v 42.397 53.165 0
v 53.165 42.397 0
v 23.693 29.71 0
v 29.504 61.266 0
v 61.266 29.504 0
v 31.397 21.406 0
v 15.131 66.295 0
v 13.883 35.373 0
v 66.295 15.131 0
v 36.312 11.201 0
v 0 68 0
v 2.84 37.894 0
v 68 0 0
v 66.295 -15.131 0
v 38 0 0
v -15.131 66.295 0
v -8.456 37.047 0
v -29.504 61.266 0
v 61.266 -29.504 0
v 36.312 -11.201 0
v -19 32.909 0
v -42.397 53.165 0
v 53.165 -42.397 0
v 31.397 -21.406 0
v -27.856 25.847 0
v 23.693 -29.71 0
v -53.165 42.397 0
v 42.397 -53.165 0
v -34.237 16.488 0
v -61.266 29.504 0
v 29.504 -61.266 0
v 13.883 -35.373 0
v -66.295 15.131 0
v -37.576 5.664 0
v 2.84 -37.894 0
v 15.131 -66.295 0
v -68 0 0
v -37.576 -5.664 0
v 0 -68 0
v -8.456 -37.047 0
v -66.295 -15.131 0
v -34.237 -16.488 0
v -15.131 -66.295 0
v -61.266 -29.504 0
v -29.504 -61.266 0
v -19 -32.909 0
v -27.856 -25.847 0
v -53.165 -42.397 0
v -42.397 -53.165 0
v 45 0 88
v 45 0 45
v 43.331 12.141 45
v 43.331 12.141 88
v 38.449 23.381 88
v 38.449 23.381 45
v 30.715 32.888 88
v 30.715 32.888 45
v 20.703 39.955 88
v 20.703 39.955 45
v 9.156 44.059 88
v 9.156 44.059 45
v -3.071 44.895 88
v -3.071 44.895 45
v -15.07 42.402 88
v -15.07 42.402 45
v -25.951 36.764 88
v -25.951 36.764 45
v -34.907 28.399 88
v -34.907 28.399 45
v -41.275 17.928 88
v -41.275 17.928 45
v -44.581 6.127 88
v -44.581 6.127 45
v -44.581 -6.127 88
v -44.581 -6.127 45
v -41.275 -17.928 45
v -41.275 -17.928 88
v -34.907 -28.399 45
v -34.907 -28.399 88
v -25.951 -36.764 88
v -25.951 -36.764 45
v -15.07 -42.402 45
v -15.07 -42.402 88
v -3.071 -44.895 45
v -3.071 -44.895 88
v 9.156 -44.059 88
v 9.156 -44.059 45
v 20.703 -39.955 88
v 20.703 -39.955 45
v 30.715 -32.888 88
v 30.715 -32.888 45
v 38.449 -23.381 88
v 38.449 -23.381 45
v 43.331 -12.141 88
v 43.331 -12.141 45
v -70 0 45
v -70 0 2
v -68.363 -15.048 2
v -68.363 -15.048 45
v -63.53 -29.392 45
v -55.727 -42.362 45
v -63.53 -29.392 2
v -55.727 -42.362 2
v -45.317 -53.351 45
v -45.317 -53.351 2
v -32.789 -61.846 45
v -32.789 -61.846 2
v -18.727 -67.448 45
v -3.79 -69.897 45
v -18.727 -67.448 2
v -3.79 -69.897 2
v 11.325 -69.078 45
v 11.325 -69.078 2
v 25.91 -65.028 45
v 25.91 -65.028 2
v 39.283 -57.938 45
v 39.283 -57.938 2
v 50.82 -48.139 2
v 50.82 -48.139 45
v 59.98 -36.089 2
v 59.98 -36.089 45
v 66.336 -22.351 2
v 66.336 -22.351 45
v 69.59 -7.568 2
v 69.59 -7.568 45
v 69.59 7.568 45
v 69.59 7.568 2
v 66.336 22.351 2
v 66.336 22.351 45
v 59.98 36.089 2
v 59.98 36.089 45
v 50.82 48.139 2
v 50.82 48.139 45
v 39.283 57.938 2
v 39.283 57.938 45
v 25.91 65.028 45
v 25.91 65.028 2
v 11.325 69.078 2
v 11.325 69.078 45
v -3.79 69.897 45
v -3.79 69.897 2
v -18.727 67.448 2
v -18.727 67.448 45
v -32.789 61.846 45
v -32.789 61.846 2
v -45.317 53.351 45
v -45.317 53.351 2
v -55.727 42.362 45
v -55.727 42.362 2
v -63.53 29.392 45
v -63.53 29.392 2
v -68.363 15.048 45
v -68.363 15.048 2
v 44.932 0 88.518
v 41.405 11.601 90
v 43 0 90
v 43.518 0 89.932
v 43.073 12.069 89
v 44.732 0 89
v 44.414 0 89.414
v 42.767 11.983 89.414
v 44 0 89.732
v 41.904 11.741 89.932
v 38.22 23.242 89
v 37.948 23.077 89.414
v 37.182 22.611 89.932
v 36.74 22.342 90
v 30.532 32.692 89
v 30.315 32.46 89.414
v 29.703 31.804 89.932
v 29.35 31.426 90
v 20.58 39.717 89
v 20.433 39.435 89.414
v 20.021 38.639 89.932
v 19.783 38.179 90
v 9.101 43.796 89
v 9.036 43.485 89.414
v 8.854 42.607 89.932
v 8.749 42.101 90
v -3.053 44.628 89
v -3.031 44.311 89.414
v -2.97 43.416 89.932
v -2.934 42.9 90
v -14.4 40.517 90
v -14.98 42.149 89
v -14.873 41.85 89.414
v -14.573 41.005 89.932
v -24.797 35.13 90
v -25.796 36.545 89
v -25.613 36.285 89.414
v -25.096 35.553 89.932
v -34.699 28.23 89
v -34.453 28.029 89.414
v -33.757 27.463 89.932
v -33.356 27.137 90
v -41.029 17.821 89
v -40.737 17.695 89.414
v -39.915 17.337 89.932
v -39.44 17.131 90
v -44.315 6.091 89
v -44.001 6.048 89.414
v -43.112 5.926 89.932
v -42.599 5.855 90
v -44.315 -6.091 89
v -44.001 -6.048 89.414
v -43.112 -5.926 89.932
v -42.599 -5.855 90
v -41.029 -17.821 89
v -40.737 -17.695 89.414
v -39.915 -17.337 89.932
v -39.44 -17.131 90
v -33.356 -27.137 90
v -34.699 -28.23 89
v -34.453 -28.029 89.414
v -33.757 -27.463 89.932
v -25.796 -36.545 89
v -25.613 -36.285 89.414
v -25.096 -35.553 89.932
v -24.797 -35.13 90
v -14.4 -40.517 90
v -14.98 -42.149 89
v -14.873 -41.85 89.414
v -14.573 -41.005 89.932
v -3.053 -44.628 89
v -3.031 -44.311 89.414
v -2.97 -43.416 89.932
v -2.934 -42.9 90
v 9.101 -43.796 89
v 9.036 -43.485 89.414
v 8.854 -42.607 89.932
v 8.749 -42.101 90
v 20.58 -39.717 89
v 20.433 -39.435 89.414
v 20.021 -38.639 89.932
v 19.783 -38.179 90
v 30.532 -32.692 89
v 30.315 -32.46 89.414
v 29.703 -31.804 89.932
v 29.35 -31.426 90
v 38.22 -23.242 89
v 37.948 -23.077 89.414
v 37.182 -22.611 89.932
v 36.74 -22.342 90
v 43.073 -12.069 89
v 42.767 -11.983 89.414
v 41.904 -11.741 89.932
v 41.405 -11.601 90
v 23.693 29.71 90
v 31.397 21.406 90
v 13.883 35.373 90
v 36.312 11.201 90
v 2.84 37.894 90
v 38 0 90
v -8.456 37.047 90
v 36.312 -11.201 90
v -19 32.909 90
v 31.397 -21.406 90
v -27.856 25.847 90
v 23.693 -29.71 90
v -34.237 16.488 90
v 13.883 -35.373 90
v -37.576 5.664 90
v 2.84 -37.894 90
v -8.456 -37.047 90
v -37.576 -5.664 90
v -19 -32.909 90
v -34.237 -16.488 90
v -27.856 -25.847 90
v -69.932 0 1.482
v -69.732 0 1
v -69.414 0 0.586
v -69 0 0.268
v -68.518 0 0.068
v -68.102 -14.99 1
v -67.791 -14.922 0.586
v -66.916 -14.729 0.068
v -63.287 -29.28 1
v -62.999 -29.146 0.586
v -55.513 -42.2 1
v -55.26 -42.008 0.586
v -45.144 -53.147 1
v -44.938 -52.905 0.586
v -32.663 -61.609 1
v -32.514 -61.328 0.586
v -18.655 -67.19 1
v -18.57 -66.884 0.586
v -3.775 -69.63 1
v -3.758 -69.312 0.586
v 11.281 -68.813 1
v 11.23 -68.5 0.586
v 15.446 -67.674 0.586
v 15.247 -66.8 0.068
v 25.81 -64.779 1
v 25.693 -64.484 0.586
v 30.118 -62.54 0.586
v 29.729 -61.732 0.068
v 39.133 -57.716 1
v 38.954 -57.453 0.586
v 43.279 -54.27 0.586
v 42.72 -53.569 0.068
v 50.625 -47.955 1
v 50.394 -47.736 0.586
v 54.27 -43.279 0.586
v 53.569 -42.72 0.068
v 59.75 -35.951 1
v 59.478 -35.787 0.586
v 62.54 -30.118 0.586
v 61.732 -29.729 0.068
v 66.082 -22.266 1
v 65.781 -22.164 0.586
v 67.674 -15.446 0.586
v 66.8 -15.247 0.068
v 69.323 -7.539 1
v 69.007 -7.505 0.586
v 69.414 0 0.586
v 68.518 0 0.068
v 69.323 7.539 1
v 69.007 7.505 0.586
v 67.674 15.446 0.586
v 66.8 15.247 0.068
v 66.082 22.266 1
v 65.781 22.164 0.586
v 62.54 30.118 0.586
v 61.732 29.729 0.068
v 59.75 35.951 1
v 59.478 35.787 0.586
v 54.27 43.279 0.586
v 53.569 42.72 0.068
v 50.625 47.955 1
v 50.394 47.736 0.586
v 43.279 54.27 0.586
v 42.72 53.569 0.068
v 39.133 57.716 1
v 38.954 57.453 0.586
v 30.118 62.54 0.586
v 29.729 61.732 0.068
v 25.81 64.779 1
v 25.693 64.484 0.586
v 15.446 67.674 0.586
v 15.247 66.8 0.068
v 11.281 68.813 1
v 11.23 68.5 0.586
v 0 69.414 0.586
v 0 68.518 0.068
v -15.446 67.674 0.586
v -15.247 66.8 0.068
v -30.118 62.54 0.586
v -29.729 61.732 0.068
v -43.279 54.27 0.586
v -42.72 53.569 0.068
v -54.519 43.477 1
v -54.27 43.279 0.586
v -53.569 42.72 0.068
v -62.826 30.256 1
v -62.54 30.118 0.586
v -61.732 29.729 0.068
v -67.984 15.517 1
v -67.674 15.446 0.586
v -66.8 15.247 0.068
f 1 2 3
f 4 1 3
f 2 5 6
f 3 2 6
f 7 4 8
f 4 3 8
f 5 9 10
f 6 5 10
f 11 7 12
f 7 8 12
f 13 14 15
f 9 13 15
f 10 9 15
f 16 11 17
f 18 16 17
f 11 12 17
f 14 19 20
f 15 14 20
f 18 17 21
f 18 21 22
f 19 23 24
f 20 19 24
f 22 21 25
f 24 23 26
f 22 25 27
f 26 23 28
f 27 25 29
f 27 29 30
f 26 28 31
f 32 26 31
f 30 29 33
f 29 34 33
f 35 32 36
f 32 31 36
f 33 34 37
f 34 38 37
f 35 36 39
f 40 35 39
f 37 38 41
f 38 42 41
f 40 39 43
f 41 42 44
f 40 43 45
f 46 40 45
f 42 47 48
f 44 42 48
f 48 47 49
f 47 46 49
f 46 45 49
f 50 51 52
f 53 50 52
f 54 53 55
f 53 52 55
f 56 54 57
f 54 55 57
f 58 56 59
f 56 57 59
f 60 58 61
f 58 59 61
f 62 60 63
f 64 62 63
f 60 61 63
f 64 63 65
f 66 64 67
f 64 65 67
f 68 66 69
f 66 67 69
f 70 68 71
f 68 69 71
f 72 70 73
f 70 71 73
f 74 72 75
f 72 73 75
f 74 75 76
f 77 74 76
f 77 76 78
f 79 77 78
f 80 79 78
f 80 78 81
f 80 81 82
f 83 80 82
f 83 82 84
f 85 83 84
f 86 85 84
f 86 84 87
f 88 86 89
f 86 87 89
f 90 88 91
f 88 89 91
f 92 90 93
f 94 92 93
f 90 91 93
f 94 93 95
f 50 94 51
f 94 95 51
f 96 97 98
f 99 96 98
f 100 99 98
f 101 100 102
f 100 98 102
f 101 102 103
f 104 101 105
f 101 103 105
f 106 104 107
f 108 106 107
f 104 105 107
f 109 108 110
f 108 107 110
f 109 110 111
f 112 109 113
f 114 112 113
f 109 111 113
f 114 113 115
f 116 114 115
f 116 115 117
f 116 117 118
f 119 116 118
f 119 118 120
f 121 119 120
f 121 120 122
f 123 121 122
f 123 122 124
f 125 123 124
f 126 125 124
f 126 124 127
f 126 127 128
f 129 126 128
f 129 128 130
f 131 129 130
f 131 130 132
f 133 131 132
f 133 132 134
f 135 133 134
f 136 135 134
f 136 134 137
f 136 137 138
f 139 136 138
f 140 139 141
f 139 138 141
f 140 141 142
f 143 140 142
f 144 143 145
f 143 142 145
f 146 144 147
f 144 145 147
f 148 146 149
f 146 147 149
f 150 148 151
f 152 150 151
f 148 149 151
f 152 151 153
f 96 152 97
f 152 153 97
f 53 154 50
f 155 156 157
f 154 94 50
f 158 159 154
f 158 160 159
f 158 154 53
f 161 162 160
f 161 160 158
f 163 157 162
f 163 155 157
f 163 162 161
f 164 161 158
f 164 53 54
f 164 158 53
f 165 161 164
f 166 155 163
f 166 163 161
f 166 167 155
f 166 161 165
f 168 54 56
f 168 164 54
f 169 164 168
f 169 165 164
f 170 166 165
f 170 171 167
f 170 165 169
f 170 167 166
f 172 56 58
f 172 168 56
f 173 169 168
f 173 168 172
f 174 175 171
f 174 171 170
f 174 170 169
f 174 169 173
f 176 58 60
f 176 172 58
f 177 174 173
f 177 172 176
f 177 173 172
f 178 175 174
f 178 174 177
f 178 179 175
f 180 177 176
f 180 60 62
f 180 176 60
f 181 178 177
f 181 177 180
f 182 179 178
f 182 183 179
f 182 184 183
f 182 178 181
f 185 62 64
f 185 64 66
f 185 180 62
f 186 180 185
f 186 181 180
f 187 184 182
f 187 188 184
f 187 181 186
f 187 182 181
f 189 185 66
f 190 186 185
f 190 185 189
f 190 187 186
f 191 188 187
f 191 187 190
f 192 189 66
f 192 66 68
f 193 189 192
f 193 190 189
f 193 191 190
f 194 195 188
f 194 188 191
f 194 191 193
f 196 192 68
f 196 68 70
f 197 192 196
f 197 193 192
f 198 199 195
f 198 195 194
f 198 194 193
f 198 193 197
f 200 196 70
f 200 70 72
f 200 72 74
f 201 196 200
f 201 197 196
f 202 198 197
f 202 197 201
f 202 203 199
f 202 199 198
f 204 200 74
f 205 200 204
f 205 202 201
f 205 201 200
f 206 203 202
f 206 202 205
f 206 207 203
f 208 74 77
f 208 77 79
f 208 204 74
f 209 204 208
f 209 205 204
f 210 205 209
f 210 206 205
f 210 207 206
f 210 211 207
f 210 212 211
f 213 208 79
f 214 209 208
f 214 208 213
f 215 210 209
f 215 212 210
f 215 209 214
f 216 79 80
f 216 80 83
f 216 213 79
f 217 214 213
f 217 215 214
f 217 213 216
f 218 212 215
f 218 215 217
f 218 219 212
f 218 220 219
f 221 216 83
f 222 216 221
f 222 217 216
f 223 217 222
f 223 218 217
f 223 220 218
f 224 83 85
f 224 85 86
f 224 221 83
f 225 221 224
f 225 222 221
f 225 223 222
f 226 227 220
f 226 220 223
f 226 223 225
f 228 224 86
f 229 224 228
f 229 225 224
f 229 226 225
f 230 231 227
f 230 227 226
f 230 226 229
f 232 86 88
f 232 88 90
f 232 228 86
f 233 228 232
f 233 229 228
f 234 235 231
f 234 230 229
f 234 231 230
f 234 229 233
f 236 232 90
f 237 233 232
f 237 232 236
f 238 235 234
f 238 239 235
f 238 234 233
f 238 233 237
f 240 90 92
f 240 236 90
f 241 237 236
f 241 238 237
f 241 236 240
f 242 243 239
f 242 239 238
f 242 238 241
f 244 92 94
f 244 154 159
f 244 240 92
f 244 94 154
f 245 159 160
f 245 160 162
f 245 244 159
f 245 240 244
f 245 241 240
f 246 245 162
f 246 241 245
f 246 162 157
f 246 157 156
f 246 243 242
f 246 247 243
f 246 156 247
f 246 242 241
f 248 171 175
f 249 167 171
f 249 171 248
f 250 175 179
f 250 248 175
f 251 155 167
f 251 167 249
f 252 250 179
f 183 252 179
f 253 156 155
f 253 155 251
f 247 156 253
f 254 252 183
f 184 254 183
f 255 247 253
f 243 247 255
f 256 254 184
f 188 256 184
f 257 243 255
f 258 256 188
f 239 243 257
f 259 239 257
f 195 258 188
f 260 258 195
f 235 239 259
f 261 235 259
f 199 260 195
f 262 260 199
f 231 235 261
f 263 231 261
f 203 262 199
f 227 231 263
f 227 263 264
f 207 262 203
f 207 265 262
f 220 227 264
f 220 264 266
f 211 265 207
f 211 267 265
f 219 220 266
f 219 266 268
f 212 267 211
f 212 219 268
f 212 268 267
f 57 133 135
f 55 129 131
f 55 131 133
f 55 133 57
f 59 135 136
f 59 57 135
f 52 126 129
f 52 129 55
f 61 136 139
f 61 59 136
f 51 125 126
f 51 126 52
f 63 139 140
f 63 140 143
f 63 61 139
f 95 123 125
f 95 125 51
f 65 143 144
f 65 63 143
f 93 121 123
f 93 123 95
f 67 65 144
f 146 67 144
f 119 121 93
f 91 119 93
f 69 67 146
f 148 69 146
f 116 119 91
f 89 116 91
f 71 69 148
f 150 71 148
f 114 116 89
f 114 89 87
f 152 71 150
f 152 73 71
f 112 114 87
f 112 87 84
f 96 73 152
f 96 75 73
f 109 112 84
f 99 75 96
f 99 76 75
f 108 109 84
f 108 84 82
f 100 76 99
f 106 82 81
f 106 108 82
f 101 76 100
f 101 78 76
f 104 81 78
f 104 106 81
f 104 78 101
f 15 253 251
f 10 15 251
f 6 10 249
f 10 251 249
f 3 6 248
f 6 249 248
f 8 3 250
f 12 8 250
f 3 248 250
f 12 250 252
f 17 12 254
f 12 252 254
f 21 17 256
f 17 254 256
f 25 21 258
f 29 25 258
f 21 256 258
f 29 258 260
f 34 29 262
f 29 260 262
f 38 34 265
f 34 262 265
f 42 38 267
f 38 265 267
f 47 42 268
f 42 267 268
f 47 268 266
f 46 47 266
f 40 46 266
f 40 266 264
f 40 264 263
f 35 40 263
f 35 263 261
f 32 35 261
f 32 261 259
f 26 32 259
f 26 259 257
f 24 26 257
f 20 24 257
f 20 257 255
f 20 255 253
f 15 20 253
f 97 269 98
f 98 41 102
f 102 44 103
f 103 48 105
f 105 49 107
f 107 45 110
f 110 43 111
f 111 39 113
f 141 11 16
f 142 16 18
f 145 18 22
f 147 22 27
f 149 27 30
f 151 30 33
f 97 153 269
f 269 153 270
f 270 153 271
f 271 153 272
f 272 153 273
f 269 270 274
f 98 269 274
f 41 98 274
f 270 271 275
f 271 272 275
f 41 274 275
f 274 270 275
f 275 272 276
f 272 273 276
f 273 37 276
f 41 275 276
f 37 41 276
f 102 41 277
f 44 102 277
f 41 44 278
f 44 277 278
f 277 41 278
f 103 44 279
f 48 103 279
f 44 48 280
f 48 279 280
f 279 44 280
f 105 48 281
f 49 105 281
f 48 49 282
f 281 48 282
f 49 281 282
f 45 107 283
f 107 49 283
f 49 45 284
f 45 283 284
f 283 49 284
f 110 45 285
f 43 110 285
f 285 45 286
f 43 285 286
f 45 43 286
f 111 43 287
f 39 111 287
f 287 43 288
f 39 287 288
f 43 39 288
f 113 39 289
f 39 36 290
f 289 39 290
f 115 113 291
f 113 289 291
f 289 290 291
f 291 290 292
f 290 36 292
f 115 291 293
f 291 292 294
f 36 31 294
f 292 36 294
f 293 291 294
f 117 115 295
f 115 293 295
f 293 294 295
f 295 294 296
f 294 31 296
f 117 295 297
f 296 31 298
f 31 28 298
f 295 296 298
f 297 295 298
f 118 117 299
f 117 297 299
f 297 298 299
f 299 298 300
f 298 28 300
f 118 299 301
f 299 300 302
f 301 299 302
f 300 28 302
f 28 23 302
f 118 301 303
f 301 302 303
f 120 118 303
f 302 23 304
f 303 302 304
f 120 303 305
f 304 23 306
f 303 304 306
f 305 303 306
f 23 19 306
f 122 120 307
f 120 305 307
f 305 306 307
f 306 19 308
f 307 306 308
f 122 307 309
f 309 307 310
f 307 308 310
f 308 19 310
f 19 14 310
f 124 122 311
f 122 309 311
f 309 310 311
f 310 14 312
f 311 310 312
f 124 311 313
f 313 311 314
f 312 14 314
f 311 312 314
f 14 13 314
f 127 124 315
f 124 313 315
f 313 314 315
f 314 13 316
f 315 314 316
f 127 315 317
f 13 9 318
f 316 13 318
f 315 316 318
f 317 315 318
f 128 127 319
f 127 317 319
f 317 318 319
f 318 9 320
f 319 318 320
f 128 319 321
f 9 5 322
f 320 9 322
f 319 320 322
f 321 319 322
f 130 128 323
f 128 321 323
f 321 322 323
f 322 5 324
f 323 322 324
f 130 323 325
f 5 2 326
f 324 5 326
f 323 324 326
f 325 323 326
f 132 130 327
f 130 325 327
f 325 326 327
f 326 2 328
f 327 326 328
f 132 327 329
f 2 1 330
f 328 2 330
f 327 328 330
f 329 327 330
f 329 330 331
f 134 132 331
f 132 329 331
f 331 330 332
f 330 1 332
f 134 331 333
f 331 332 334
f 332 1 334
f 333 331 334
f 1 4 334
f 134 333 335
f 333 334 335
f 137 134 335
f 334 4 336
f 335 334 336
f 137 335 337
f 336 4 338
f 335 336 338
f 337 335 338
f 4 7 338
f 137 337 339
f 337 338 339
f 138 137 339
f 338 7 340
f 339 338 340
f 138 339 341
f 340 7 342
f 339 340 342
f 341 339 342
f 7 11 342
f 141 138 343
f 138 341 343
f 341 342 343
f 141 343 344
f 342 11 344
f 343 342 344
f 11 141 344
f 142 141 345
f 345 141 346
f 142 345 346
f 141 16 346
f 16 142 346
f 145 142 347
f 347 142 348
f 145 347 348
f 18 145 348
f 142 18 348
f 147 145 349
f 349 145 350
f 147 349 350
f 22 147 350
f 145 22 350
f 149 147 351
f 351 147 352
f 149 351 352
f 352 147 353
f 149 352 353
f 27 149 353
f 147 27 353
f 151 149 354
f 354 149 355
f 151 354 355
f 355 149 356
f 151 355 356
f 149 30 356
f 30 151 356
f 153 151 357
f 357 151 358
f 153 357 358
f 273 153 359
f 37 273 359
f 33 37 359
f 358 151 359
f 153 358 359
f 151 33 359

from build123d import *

# Parameters (mm, degrees)
SKETCH_1_R          = 70
EXTRUDE_1_DEPTH     = 90
SKETCH_2_R          = 38
CUT_EXTRUDE_1_DEPTH = 134.790881603
CUT_EXTRUDE_START   = -45
SKETCH_3_R          = 70
SKETCH_3_R_2        = 45
CUT_EXTRUDE_2_DEPTH = 45
FILLET_1_R          = 2


with BuildPart() as part:
    # 草图1 → 凸台-拉伸1 (new body)
    with BuildSketch(Plane.XY):
        with Locations(Location((0, 0, 0), (0, 0, 180))):
            Circle(SKETCH_1_R)
    extrude(amount=EXTRUDE_1_DEPTH)

    # 草图2 → 切除-拉伸1 (cut, through all)
    with BuildSketch(Plane.XY.offset(90)):
        Circle(SKETCH_2_R)
    extrude(amount=-CUT_EXTRUDE_1_DEPTH, mode=Mode.SUBTRACT)

    # 草图3 → 切除-拉伸2 (cut)
    with BuildSketch(Plane.XY.offset(90).offset(CUT_EXTRUDE_START)):
        with Locations(Location((0, 0, 0), (0, 0, 180))):
            Circle(SKETCH_3_R)
        Circle(SKETCH_3_R_2, mode=Mode.SUBTRACT)
    extrude(amount=CUT_EXTRUDE_2_DEPTH, mode=Mode.SUBTRACT)

    # 圆角1
    fillet_1_edges = [part.edges().sort_by_distance(p)[0] for p in [
        (-45, 0, 90),
        (70, 0, 0),
    ]]
    fillet(fillet_1_edges, radius=FILLET_1_R)


solid = part.part
